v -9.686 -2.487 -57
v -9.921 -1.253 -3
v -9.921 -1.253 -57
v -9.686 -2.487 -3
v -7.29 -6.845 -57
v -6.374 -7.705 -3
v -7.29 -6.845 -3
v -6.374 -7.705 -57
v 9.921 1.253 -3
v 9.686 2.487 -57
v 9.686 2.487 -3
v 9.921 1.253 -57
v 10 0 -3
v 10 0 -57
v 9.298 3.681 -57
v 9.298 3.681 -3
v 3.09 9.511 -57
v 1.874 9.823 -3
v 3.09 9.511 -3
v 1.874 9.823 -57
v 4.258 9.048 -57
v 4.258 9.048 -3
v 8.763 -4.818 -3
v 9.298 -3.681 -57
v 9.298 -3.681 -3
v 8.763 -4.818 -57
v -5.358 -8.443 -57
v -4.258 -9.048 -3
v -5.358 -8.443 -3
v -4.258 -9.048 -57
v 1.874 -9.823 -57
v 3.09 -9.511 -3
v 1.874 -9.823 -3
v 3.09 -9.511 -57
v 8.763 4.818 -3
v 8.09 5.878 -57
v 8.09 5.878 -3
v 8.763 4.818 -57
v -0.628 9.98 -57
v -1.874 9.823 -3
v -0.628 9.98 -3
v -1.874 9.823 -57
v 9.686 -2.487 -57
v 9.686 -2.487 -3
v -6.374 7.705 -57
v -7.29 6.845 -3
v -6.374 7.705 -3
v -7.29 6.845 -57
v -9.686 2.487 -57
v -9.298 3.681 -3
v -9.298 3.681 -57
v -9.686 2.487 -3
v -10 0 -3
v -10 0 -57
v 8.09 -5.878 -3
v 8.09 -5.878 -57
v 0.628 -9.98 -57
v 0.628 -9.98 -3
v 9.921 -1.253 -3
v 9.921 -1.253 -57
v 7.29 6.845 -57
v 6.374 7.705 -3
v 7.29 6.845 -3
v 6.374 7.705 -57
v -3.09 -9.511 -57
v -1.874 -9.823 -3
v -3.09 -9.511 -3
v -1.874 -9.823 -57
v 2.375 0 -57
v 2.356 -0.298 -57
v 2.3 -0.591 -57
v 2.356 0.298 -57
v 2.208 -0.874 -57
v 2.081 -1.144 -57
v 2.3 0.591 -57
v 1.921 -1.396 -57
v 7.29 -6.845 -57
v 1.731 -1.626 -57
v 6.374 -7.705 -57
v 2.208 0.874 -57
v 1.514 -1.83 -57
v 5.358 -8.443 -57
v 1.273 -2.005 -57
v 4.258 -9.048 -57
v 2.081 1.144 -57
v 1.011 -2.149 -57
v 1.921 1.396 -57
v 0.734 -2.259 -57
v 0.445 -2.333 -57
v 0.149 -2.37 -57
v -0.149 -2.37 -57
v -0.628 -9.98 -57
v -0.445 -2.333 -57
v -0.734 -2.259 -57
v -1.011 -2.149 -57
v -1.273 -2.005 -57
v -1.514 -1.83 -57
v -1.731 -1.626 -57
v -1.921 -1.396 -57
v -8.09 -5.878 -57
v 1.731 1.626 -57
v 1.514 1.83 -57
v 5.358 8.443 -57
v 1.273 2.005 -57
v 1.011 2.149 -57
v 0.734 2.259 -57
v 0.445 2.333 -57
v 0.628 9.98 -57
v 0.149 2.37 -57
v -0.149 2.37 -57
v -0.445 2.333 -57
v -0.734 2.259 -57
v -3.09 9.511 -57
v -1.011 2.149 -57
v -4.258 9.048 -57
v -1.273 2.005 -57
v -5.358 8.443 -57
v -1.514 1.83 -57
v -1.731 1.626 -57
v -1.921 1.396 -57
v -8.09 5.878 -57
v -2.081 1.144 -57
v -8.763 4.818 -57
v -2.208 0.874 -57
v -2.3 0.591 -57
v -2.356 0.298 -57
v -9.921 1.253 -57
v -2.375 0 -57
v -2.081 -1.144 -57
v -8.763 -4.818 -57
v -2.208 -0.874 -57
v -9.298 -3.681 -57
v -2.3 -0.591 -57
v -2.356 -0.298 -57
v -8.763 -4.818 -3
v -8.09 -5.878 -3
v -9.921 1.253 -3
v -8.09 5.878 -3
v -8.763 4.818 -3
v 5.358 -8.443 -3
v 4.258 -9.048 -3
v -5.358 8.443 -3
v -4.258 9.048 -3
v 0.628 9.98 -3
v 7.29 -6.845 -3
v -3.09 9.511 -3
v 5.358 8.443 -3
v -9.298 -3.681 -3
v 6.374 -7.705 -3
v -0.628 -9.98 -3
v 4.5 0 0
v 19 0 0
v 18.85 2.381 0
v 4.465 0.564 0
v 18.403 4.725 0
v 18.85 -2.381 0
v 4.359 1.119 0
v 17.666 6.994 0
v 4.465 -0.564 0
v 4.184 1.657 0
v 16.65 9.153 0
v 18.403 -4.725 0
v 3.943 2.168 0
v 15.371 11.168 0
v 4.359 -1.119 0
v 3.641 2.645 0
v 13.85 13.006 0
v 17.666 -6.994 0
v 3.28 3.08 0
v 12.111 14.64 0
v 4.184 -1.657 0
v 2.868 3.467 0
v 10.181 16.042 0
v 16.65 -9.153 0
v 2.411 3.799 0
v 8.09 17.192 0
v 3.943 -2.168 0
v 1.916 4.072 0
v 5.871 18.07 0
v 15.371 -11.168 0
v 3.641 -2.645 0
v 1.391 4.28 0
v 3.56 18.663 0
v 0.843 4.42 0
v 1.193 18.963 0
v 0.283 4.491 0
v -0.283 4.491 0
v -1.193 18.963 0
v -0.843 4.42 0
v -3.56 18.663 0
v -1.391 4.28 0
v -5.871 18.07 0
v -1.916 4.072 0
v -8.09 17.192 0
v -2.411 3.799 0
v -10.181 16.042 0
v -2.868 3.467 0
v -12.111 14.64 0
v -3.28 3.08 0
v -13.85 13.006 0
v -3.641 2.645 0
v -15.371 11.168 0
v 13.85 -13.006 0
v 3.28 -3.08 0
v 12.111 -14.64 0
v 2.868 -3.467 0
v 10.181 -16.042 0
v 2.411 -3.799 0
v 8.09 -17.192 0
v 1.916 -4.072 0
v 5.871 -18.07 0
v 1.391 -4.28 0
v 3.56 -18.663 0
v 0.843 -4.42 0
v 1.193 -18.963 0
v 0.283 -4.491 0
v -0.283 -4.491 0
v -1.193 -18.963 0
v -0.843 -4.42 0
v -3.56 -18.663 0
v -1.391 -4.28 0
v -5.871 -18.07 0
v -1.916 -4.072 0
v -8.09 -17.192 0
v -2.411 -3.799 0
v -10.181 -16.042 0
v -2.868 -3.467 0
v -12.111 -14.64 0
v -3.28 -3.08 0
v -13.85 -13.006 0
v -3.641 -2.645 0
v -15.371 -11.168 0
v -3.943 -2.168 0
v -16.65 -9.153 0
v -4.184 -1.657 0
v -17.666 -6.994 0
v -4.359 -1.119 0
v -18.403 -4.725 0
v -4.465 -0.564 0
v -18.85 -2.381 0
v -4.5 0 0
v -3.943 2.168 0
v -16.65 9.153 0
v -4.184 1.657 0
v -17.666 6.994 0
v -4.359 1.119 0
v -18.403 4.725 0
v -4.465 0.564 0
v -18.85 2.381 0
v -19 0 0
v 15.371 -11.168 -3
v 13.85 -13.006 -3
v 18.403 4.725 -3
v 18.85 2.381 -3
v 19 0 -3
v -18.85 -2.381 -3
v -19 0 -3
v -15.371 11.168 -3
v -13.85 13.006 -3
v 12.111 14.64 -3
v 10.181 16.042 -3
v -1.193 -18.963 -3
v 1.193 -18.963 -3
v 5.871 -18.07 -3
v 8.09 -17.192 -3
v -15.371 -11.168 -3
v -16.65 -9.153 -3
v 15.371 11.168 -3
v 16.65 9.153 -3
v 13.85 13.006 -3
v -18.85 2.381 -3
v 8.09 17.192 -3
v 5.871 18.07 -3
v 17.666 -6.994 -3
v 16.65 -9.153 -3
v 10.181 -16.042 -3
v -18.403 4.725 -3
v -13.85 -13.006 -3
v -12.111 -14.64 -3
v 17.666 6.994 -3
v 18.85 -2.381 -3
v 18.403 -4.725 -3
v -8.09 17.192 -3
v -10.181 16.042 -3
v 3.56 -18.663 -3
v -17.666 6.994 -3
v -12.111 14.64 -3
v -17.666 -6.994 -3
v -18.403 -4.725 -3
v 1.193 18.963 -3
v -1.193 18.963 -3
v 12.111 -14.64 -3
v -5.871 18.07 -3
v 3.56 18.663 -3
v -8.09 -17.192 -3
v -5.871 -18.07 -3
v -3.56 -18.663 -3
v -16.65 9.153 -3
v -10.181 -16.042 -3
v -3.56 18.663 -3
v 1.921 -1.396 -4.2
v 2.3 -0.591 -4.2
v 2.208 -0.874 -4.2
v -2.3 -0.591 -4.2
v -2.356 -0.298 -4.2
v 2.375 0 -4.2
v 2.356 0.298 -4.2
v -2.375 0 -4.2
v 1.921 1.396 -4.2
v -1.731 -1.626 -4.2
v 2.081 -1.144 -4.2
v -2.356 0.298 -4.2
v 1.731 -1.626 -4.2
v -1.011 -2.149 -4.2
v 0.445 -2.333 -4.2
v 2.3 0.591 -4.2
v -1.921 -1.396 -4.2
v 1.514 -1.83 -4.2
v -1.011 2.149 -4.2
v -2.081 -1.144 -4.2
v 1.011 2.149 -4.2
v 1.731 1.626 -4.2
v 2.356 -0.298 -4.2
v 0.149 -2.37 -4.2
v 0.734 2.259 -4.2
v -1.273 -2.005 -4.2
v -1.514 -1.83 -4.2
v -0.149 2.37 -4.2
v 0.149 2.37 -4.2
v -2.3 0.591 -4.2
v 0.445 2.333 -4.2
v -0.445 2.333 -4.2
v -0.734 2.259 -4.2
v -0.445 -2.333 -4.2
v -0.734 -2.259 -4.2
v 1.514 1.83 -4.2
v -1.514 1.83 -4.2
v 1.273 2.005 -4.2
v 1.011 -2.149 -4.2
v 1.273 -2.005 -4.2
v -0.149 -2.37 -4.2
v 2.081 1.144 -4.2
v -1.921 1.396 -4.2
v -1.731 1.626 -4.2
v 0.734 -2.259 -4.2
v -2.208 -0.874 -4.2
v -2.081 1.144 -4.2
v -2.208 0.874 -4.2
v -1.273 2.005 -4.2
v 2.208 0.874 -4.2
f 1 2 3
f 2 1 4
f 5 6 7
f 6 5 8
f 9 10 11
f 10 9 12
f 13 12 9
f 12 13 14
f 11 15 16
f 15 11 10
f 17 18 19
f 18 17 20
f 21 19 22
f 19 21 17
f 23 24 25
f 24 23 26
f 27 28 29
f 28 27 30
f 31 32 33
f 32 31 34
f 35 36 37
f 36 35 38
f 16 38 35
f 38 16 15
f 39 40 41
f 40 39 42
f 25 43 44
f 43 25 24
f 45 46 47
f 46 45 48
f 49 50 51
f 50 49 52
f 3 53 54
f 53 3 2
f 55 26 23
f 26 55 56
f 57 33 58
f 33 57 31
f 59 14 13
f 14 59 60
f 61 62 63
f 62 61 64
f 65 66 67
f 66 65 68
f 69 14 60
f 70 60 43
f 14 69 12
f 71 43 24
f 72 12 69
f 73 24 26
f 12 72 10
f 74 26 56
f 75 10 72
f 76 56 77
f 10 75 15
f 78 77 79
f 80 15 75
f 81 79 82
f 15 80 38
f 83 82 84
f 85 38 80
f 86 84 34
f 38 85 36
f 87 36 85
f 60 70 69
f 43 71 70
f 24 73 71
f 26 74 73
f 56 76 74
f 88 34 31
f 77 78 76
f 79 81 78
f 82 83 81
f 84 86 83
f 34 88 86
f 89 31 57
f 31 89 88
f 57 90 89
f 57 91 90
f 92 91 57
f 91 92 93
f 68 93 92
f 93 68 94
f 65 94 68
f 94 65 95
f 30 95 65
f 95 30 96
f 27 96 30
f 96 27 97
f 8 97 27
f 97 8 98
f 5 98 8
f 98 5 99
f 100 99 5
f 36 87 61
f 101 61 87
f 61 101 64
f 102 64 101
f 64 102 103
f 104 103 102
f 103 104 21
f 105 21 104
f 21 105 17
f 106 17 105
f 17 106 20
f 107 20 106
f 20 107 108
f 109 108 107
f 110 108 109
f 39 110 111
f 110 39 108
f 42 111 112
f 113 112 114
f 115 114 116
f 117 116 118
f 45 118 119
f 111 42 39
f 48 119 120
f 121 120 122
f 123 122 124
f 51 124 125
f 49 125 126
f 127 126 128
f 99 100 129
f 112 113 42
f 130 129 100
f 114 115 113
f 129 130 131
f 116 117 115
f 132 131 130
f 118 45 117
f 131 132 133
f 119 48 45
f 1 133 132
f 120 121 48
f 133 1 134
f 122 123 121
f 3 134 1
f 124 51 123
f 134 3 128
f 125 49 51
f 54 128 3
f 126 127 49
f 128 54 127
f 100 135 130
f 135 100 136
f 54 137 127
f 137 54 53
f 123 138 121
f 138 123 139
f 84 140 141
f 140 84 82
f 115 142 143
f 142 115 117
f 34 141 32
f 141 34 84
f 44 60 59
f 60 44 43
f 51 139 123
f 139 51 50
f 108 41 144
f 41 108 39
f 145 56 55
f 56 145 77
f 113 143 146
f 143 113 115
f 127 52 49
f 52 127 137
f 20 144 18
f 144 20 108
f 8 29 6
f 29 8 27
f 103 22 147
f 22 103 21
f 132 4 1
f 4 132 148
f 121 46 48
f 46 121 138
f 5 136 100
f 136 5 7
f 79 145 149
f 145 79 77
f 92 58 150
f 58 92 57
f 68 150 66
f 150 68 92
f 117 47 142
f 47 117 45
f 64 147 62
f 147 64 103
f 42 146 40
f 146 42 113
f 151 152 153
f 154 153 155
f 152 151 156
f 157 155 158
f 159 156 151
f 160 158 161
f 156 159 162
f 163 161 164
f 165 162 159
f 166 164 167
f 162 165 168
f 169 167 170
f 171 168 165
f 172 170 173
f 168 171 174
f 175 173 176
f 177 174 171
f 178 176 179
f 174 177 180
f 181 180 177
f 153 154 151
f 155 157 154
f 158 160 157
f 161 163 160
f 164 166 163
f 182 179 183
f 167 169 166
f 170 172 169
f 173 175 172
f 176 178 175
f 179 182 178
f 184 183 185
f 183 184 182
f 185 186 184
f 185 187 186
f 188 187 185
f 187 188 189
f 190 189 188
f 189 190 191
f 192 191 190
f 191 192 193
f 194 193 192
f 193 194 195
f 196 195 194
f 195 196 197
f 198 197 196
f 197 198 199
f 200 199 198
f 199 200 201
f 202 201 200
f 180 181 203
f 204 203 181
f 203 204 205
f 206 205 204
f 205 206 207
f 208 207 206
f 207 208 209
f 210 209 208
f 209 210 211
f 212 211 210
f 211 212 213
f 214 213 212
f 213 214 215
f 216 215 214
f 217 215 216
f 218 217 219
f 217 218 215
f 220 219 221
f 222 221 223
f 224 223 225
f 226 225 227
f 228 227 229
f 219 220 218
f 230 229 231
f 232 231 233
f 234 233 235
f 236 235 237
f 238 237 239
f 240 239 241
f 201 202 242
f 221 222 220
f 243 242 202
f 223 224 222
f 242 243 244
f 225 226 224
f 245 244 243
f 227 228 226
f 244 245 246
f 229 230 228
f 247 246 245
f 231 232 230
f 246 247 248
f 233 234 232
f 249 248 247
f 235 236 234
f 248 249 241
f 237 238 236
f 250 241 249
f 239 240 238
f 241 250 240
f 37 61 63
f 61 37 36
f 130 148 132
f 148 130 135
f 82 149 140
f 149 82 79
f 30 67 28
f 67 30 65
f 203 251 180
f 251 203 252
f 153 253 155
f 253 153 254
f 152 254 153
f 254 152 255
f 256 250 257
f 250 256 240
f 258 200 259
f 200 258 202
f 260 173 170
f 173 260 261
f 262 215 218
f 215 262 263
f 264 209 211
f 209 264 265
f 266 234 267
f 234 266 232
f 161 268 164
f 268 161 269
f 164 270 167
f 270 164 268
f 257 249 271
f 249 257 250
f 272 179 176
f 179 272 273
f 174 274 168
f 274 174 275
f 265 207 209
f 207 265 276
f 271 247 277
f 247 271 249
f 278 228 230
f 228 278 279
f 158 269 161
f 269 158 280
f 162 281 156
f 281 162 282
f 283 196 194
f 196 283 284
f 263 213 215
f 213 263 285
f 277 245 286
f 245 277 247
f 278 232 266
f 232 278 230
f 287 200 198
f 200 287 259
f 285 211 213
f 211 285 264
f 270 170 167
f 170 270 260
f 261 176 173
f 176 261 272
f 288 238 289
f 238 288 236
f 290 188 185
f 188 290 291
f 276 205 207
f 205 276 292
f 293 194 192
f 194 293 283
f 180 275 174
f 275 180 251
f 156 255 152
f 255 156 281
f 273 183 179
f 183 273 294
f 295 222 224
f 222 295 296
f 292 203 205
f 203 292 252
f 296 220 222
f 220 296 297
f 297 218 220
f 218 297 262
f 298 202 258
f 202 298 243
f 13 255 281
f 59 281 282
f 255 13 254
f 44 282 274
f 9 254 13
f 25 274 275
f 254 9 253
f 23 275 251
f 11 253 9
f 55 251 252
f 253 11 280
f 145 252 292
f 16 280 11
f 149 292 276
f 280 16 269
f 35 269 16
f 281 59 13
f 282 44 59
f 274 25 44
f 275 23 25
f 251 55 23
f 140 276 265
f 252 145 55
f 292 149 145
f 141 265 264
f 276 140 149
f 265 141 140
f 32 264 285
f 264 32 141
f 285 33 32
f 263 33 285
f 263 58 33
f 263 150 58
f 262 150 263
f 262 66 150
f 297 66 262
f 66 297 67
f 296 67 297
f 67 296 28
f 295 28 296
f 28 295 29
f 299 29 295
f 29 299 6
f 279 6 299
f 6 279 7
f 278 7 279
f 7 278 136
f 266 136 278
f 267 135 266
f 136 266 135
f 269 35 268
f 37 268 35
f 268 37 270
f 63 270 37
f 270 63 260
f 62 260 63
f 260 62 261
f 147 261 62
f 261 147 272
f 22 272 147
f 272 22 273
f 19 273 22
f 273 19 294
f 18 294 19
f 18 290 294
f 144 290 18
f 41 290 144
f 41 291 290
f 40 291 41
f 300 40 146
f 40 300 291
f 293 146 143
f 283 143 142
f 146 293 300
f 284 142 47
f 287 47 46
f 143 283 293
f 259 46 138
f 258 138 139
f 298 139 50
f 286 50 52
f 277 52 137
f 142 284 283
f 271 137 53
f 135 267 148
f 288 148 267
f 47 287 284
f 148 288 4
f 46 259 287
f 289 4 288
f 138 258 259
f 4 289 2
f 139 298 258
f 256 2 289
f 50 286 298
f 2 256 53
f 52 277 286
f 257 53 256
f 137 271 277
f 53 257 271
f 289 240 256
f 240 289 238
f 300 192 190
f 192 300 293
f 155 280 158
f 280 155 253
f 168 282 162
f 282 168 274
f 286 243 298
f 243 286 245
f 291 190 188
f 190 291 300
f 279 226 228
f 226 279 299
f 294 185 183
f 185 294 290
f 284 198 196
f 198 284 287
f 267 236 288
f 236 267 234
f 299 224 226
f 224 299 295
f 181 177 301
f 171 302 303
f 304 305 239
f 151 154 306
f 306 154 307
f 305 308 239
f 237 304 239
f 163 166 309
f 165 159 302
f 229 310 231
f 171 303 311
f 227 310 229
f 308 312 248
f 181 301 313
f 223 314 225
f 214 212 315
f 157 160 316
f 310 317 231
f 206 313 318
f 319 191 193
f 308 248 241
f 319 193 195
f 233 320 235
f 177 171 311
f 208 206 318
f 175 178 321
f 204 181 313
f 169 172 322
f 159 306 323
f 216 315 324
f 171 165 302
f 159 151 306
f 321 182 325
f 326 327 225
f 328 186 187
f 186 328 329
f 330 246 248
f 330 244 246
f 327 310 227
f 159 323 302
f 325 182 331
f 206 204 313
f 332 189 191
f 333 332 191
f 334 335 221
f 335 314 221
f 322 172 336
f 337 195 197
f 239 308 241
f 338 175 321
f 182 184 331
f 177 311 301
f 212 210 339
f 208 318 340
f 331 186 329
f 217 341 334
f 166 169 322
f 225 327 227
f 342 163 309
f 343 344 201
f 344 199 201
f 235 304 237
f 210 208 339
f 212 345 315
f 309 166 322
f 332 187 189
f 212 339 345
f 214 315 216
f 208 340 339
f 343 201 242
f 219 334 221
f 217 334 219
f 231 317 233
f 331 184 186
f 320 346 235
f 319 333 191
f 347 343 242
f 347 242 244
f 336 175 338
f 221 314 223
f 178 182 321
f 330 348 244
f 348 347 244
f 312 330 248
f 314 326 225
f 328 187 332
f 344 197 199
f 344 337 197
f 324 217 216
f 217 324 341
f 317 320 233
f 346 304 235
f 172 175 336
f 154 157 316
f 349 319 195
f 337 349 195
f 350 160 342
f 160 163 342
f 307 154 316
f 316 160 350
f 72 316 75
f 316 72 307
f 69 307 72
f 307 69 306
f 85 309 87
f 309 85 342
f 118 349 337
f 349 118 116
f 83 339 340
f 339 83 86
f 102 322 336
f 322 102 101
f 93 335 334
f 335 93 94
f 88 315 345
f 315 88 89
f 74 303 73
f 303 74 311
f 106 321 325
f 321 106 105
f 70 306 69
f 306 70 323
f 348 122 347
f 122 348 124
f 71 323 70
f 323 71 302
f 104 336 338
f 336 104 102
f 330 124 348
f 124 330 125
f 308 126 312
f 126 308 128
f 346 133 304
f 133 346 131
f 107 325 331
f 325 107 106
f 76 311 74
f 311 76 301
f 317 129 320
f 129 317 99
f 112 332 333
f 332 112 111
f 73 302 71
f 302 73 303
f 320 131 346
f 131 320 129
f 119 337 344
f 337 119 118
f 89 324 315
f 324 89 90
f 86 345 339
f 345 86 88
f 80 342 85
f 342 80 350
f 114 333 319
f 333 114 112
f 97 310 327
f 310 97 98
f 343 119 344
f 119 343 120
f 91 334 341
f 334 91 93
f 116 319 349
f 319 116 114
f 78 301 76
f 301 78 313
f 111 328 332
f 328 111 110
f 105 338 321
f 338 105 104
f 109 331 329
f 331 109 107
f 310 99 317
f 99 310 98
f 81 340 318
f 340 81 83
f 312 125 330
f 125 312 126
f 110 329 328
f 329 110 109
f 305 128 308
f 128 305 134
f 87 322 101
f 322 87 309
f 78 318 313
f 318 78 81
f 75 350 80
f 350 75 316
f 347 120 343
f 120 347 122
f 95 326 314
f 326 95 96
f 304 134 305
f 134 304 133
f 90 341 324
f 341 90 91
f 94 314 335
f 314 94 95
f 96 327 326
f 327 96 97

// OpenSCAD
$fn = 50;


difference() {
	union() {
		translate(v = [0, 0, -57.0000000000]) {
			cylinder(h = 57, r = 10.0000000000);
		}
		translate(v = [0, 0, -3.0000000000]) {
			cylinder(h = 3, r = 19.0000000000);
		}
	}
	union() {
		translate(v = [0, 0, 0]) {
			rotate(a = [0, 0, 0]) {
				difference() {
					union() {
						#translate(v = [0, 0, -57.0000000000]) {
							cylinder(h = 57, r = 2.2500000000);
						}
						#translate(v = [0, 0, -4.2000000000]) {
							cylinder(h = 4.2000000000, r1 = 2.3750000000, r2 = 4.5000000000);
						}
						#translate(v = [0, 0, -57.0000000000]) {
							cylinder(h = 57, r = 2.3750000000);
						}
						#translate(v = [0, 0, -57.0000000000]) {
							cylinder(h = 57, r = 2.2500000000);
						}
					}
					union();
				}
			}
		}
	}
}
